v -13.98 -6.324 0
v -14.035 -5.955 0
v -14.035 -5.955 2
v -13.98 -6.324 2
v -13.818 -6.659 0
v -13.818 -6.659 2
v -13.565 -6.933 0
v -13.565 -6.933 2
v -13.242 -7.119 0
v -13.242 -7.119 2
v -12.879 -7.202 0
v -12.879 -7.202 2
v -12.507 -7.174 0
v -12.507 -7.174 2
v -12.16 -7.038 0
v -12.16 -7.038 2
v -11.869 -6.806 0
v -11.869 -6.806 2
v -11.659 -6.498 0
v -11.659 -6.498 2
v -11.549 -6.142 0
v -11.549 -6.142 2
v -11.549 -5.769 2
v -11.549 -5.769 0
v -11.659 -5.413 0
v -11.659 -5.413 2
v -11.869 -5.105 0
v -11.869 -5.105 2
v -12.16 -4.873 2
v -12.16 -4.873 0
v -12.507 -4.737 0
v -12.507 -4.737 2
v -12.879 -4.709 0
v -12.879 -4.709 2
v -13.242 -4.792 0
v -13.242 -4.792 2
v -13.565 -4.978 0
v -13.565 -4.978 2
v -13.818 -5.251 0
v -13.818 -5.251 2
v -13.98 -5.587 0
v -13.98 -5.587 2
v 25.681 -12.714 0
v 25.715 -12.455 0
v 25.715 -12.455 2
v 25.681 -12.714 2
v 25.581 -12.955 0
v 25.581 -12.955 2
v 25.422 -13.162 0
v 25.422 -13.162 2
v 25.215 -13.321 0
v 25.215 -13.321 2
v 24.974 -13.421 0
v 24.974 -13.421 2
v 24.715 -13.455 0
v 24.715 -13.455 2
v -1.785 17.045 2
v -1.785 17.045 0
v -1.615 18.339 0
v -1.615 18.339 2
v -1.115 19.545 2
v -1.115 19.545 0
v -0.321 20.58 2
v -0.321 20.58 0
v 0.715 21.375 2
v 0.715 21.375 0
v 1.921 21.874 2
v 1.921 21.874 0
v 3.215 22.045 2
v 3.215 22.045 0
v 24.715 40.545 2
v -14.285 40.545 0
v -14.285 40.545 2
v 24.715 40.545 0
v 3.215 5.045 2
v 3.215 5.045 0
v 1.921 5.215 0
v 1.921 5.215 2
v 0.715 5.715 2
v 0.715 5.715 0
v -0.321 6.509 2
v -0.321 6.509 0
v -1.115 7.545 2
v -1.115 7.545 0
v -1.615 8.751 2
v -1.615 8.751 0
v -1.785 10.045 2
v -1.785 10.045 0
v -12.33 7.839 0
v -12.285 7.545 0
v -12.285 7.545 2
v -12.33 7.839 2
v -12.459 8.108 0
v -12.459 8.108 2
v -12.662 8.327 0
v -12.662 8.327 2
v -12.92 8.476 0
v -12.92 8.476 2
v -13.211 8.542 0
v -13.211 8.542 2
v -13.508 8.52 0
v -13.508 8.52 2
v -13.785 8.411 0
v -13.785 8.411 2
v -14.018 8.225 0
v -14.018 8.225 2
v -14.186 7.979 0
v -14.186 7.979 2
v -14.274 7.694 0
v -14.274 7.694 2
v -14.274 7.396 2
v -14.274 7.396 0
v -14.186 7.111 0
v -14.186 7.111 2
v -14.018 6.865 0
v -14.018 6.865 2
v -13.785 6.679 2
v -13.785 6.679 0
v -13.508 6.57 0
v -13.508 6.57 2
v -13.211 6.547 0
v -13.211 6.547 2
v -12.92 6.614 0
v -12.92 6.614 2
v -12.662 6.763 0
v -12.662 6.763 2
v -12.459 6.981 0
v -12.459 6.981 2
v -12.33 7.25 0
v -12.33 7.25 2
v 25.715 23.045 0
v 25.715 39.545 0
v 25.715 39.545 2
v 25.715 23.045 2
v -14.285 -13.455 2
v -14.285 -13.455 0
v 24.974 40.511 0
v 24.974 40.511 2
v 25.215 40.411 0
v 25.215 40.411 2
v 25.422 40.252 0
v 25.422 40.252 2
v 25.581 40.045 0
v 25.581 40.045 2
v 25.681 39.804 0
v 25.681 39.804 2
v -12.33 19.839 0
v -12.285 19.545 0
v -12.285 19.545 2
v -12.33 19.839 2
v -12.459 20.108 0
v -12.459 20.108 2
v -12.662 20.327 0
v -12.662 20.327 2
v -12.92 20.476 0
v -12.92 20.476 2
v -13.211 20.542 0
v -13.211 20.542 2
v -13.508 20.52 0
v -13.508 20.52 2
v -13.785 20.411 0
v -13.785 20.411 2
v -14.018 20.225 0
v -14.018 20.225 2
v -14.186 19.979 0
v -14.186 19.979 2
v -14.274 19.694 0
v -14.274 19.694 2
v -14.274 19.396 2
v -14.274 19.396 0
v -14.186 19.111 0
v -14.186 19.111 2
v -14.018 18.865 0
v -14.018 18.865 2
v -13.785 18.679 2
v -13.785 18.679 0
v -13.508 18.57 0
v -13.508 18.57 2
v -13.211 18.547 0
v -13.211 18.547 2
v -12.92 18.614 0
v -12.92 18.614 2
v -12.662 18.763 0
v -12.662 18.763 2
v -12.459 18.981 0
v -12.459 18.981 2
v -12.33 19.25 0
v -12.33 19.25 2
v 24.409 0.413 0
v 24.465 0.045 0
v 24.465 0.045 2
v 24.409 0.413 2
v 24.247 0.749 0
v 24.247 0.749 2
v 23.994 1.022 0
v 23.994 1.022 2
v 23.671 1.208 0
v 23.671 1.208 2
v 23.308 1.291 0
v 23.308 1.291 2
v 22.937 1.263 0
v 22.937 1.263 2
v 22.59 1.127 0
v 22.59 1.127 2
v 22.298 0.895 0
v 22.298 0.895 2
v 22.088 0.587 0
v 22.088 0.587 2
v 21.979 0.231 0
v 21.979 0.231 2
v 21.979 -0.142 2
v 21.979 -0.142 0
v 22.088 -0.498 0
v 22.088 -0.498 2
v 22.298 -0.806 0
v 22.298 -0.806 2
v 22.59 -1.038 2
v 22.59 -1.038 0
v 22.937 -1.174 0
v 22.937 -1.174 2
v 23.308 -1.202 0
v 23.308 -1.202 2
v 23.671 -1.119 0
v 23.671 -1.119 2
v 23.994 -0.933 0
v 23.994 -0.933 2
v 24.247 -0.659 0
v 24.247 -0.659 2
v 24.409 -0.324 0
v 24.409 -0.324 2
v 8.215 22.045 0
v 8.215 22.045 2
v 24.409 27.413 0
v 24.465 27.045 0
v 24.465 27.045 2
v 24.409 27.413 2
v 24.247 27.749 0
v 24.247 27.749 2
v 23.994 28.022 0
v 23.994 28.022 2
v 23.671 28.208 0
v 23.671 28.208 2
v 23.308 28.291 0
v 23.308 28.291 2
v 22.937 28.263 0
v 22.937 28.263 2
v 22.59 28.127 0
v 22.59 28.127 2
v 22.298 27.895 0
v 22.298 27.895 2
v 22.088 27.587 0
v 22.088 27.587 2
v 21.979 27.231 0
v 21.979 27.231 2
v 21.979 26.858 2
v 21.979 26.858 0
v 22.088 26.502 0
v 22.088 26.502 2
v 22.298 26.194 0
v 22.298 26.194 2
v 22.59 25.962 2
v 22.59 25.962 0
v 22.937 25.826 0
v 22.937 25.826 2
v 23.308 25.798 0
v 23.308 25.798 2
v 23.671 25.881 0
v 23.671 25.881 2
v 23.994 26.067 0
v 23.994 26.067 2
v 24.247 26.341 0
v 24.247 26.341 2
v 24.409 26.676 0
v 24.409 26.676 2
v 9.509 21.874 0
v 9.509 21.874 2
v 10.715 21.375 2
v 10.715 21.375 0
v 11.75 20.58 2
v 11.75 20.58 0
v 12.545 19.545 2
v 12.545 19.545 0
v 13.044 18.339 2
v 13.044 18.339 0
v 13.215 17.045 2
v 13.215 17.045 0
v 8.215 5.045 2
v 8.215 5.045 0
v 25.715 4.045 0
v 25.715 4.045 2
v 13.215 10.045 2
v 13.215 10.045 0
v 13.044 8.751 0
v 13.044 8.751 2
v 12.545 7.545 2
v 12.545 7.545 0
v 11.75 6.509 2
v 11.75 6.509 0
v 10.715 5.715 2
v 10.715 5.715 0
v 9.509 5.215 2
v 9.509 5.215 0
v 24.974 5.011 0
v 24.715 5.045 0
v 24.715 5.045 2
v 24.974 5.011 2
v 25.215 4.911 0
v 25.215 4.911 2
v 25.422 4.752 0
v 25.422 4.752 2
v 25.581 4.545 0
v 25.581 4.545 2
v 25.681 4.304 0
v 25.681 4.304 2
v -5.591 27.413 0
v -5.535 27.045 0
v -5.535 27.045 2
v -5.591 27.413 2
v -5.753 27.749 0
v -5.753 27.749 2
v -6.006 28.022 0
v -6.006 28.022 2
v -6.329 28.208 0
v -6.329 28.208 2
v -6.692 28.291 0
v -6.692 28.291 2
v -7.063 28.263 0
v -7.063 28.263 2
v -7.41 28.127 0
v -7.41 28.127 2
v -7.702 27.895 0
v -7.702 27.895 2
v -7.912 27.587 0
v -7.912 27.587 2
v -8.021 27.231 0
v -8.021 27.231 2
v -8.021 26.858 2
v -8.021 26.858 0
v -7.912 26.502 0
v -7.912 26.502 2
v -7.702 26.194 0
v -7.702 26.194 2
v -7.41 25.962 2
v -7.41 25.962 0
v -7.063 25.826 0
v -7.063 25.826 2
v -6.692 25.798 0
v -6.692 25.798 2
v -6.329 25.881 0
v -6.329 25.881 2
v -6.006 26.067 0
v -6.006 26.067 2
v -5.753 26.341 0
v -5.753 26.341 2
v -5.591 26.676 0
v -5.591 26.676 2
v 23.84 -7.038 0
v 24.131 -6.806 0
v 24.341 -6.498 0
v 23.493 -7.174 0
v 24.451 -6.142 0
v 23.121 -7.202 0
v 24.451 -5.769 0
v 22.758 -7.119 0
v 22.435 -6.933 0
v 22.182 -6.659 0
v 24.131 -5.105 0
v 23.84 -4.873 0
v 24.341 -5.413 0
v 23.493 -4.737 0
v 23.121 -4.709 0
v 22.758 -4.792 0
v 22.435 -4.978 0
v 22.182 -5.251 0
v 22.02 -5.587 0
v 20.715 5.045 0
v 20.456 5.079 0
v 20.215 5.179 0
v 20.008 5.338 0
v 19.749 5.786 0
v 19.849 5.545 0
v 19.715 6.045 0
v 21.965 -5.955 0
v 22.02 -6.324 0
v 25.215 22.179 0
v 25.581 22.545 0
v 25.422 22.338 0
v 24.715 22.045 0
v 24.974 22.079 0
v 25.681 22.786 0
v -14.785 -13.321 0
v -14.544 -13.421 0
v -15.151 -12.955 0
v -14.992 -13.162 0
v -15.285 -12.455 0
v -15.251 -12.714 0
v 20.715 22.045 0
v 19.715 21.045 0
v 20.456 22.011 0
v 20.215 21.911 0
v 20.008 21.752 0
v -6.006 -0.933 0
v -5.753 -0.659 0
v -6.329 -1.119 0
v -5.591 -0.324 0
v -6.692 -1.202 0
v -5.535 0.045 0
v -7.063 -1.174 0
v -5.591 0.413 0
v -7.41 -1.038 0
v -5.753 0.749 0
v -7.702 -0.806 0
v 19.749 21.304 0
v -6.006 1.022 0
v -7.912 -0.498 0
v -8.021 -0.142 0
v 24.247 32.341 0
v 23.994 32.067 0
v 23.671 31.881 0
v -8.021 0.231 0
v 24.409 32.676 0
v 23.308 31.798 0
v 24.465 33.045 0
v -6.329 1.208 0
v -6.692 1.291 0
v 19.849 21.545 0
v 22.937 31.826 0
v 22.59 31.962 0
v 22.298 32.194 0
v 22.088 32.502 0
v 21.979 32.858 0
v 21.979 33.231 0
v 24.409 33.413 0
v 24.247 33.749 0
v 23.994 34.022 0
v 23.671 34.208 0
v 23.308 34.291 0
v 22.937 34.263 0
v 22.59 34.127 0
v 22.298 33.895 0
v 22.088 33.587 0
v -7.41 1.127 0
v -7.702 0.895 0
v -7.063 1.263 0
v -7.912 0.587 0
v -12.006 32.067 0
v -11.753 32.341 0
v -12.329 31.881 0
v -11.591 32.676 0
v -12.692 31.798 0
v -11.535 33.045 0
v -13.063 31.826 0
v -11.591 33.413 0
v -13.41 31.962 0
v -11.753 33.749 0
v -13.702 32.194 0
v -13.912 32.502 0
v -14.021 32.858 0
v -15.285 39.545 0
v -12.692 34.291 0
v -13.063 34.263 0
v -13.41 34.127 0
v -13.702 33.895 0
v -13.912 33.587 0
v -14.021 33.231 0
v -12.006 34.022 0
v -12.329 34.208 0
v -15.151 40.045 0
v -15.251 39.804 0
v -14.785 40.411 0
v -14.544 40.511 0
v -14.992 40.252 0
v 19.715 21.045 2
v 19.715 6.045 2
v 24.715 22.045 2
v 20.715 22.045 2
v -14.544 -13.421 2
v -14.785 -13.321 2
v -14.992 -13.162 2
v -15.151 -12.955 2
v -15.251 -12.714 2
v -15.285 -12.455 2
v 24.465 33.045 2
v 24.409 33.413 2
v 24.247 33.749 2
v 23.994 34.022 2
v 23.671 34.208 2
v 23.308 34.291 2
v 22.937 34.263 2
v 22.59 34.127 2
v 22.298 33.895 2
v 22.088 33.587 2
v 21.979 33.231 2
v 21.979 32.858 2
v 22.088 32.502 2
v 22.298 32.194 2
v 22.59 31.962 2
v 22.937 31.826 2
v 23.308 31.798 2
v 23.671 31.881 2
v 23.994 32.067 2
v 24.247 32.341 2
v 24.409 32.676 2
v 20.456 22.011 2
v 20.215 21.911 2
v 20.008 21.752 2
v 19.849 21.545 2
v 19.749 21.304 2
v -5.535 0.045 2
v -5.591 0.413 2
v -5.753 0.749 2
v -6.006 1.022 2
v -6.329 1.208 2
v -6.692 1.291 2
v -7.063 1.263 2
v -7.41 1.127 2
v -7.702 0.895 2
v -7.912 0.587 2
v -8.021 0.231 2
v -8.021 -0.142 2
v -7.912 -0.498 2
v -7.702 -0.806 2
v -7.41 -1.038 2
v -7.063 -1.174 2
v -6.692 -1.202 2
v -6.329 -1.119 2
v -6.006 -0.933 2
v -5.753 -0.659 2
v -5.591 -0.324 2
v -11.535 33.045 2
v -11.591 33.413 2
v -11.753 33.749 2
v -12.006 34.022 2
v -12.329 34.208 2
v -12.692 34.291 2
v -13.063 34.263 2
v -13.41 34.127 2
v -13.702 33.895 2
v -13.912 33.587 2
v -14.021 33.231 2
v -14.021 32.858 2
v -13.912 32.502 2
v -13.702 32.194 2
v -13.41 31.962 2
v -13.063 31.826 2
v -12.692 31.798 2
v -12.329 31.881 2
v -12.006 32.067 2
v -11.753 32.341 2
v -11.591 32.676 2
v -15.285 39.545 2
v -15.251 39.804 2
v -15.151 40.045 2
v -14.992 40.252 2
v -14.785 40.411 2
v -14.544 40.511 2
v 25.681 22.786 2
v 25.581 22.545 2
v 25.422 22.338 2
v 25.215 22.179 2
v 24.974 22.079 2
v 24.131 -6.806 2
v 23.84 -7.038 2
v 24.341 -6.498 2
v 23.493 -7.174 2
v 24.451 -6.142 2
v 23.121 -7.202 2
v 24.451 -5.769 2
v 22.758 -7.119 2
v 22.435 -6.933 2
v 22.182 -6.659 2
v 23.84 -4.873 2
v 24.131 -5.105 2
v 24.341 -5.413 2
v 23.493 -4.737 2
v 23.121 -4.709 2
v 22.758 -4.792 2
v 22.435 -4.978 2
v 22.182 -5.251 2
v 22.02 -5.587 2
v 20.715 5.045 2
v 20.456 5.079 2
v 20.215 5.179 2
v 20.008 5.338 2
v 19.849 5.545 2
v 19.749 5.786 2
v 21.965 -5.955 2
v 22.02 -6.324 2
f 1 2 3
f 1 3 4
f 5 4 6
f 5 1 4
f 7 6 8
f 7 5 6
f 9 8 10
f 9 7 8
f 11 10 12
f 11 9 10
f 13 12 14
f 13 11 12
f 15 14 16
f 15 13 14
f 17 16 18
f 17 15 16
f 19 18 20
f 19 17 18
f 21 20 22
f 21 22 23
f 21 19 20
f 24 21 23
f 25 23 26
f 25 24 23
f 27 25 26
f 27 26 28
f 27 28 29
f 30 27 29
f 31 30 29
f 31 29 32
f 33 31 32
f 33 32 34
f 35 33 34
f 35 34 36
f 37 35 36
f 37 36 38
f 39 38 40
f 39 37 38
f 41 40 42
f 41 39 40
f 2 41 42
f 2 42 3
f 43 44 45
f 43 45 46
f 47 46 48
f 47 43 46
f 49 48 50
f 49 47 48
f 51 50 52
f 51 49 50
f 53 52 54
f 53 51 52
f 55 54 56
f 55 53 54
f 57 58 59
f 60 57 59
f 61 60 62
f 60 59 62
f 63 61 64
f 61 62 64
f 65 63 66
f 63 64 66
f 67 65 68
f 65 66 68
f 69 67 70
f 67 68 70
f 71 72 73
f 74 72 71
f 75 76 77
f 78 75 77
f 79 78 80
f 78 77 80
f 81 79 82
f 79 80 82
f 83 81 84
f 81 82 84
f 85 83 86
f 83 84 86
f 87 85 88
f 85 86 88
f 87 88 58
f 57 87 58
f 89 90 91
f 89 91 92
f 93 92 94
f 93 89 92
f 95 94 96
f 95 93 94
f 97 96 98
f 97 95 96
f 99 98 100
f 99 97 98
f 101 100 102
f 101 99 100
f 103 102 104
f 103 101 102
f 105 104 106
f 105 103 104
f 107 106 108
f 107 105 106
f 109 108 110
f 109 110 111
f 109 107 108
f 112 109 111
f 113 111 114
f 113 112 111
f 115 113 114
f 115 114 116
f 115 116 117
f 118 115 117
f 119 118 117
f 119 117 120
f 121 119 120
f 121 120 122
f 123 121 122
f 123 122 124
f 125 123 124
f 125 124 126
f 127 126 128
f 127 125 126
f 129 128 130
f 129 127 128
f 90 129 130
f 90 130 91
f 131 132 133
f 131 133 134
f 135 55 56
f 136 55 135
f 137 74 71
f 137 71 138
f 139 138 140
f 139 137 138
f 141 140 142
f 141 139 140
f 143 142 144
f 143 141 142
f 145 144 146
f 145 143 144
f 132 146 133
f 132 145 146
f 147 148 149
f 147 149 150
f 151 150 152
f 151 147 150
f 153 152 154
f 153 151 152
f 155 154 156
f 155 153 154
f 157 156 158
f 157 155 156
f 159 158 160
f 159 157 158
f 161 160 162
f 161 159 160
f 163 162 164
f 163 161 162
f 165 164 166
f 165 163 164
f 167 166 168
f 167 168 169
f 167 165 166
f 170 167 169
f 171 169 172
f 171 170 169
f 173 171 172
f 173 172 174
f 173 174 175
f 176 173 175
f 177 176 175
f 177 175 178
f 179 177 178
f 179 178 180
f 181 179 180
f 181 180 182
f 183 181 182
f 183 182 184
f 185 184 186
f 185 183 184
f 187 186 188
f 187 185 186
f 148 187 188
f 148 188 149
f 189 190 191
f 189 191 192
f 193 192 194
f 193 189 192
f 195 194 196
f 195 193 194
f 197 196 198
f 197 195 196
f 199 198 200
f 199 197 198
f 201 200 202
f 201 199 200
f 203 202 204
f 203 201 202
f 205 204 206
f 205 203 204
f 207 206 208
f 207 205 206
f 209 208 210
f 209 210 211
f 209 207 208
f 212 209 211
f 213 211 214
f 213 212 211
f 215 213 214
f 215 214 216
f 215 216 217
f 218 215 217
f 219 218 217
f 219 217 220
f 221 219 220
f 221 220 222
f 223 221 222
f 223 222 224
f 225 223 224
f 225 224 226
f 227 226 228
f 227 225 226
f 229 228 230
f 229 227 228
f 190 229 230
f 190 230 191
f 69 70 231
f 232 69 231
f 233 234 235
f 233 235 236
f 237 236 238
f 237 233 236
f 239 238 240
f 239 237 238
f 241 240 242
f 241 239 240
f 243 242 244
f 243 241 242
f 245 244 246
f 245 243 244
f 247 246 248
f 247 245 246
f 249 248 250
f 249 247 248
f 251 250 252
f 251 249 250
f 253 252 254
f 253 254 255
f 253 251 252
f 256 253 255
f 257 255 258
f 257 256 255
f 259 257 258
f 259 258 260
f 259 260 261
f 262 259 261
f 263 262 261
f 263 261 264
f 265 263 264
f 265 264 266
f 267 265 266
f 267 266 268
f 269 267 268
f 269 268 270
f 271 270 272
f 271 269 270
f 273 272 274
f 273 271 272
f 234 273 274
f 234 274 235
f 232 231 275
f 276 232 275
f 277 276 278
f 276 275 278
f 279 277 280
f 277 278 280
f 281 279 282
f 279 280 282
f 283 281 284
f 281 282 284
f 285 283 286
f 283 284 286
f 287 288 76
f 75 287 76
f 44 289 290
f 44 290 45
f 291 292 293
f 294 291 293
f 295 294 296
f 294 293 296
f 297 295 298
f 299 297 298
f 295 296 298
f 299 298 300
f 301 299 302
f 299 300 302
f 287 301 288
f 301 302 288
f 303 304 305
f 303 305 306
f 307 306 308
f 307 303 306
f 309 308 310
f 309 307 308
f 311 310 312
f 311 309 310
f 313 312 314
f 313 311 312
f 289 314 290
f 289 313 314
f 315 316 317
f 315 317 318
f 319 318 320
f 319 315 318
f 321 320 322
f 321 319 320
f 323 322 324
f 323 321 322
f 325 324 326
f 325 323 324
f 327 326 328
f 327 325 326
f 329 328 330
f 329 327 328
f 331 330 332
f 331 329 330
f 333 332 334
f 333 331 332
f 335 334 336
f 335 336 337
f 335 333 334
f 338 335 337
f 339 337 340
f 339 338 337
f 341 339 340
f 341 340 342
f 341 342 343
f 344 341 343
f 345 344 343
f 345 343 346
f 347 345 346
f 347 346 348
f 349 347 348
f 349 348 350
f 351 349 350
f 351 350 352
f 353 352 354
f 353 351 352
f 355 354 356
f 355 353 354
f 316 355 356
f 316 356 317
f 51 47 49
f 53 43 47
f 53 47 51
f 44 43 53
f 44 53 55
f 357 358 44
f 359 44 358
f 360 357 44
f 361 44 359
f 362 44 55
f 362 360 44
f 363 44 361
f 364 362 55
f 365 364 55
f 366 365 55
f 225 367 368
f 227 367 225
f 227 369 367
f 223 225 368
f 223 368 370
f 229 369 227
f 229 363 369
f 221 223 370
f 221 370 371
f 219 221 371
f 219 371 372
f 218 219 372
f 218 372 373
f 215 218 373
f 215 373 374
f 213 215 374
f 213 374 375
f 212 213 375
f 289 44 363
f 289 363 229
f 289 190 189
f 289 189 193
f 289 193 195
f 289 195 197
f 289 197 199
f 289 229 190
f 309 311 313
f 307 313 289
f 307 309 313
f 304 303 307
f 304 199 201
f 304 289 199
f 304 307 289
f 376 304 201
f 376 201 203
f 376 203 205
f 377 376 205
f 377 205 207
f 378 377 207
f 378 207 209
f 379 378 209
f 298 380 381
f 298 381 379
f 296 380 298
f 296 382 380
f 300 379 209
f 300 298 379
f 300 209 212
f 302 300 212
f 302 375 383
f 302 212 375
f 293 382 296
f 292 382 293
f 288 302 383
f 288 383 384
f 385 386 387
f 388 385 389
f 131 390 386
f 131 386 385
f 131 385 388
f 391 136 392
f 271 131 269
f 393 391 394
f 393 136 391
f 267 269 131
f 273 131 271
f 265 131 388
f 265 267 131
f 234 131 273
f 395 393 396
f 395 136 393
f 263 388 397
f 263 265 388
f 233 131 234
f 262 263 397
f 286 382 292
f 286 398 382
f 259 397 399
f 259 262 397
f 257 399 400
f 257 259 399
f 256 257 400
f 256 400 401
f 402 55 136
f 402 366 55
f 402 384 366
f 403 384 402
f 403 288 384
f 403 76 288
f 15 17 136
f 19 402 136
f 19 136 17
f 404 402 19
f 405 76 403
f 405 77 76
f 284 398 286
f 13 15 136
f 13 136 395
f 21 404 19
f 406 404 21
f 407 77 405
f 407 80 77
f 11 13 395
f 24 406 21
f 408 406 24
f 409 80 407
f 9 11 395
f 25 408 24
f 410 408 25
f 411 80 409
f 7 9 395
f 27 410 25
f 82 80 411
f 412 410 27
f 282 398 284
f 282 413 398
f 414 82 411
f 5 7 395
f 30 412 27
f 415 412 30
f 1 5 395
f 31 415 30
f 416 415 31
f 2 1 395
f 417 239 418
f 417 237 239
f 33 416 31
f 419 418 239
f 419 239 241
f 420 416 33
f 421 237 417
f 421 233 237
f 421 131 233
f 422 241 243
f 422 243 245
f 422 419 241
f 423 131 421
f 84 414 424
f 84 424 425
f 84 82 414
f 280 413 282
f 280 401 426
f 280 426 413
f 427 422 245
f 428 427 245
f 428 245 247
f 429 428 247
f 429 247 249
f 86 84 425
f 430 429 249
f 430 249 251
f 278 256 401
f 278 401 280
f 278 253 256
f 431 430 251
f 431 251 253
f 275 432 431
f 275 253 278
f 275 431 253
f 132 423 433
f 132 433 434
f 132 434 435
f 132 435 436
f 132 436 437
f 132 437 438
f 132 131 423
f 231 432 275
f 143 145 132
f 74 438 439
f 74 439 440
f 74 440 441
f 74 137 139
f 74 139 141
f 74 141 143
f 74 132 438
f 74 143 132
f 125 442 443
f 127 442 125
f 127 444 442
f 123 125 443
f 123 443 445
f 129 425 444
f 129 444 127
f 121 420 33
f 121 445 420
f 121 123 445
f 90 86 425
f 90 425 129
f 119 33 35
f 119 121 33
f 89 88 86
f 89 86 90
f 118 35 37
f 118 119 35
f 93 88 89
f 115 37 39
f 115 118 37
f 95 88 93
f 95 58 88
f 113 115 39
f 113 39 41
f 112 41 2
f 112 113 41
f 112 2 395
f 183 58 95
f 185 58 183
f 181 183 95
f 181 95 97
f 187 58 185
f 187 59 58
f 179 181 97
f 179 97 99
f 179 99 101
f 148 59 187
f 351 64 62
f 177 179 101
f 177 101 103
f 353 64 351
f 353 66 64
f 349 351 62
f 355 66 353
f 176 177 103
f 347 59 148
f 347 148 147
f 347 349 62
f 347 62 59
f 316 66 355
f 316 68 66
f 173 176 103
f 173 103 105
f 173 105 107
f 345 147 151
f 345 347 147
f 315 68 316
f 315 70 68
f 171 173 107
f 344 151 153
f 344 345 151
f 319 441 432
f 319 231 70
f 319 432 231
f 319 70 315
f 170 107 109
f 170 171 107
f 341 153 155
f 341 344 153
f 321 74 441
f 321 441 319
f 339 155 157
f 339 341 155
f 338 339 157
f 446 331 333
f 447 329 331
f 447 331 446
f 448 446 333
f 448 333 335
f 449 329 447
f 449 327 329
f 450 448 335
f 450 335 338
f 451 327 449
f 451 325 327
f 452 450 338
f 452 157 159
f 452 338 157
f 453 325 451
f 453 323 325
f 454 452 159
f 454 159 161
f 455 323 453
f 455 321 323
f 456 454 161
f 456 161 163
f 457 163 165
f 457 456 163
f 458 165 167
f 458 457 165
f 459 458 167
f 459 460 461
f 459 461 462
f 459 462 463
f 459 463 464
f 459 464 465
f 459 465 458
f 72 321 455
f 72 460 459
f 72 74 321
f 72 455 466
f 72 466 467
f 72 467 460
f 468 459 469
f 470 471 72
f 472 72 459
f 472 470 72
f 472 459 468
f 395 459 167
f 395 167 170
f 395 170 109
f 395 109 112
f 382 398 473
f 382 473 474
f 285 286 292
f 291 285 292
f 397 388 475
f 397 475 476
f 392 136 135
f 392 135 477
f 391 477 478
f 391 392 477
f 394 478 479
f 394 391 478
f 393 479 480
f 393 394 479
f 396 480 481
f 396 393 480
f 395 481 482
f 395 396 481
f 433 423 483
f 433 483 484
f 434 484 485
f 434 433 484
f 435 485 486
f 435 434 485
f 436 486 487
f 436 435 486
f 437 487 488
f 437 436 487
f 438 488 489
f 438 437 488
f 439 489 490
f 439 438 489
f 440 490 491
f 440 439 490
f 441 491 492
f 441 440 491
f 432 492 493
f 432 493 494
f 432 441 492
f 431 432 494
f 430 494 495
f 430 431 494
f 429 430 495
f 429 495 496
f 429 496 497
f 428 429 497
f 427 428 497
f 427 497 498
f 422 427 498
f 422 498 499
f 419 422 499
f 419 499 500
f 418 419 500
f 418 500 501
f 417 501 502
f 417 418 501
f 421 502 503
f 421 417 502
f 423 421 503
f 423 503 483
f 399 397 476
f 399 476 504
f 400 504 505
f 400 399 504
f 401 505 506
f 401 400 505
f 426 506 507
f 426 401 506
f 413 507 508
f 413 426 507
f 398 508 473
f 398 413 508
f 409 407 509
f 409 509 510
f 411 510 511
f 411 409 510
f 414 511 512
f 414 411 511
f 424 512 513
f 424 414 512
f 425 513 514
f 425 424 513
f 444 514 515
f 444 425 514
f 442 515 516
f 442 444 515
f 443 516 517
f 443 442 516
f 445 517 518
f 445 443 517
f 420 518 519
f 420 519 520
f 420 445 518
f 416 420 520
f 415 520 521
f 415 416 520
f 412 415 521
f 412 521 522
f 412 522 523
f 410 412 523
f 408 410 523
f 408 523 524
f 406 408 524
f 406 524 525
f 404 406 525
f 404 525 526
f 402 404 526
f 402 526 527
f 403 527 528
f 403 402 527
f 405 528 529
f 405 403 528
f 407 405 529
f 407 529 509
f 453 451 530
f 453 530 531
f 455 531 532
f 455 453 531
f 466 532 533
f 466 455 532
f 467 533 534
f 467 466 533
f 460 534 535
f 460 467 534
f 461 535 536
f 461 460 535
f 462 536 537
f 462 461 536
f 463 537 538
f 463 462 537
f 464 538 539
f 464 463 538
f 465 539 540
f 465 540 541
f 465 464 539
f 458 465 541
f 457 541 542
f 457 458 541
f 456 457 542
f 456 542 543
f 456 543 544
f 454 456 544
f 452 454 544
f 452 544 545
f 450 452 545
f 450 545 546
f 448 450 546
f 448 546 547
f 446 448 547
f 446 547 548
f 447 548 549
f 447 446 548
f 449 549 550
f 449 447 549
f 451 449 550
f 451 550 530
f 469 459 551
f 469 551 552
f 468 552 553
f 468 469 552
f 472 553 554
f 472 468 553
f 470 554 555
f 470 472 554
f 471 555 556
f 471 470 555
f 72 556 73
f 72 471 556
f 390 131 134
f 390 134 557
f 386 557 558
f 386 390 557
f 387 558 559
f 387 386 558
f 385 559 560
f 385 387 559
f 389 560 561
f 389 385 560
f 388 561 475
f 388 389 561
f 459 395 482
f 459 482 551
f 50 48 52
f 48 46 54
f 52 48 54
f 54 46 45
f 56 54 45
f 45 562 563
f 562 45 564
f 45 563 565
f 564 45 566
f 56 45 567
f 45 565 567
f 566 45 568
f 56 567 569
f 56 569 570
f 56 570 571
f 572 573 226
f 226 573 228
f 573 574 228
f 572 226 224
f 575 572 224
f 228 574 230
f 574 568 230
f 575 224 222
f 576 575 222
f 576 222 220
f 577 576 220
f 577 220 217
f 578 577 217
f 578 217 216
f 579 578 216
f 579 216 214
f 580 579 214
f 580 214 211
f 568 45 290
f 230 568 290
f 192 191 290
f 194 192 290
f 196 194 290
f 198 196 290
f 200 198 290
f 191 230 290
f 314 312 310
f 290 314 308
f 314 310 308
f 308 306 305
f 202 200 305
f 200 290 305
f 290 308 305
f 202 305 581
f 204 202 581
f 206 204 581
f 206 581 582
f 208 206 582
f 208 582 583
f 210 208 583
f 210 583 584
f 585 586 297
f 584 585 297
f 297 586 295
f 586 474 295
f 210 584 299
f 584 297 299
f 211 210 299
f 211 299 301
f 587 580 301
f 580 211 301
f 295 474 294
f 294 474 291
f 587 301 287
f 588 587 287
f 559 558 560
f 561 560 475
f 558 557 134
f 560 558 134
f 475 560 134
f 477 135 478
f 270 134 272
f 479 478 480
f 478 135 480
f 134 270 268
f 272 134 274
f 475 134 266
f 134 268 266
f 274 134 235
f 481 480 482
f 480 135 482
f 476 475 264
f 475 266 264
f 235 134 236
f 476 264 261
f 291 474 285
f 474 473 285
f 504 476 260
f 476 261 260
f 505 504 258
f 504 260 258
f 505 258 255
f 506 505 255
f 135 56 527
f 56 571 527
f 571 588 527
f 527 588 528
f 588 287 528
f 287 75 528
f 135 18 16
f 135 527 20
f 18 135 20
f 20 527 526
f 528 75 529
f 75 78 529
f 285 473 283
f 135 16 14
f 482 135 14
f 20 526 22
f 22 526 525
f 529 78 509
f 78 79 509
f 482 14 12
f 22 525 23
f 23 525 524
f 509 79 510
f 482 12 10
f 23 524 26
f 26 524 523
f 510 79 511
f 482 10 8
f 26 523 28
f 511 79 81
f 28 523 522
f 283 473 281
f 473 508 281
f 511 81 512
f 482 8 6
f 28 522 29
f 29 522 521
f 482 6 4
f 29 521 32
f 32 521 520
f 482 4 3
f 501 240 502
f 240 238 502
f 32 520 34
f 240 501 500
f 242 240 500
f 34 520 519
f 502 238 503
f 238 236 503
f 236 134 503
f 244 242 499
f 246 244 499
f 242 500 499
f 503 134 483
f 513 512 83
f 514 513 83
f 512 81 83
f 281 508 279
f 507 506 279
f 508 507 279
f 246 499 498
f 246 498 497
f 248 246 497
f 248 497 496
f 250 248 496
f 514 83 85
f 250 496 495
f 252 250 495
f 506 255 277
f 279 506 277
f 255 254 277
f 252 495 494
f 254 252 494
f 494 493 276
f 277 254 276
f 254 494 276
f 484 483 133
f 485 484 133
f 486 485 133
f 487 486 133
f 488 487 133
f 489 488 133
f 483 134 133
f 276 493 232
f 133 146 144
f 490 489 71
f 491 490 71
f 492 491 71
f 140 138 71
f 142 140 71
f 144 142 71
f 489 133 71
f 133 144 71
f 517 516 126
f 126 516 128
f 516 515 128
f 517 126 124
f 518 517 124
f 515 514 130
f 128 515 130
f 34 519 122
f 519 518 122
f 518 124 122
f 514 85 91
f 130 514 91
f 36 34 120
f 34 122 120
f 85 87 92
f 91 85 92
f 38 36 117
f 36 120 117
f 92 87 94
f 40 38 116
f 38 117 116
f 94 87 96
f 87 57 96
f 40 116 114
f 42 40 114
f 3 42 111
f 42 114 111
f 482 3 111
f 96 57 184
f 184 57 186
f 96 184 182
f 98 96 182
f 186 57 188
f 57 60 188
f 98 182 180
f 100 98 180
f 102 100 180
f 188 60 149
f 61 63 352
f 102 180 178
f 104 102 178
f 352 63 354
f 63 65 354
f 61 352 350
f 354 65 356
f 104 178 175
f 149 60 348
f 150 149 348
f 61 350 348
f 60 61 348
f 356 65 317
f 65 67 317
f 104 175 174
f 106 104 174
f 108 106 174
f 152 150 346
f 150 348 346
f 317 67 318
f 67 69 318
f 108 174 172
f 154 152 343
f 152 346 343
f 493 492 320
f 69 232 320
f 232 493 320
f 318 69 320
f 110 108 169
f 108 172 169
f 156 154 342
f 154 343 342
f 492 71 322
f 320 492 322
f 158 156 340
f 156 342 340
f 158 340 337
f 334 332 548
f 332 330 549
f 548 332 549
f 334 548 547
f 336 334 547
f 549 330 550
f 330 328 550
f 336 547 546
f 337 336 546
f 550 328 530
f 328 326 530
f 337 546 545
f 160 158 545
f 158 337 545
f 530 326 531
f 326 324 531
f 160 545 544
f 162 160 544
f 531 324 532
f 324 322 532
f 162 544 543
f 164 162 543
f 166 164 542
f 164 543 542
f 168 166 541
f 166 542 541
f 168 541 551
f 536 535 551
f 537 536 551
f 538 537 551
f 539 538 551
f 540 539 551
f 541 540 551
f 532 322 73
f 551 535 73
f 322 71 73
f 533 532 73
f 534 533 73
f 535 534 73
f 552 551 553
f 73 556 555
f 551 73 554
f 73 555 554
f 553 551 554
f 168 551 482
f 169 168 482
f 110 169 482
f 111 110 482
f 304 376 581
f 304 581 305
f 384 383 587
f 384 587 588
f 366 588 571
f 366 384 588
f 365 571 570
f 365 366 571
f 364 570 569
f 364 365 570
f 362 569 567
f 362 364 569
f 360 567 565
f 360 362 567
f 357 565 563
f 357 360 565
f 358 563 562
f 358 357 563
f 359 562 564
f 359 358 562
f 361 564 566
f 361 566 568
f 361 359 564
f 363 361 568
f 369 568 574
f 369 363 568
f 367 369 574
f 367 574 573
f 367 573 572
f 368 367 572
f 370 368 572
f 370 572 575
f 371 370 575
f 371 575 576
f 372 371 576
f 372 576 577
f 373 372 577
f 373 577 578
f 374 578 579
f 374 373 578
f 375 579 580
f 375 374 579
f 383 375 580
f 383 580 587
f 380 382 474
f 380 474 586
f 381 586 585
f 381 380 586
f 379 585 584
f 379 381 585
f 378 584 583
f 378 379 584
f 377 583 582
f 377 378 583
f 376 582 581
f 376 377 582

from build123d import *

# Parameters (mm, degrees)
SKETCH_1_R      = 1.25
SKETCH_1_R_2    = 1
EXTRUDE_1_DEPTH = 2


with BuildPart() as part:
    # 草圖1 → 填料-伸長1 (new body)
    with BuildSketch(Plane.XY):
        with BuildLine():
            Line((25.714690816, 4.04468624), (25.714690816, -0.95531376))
            Line((25.714690816, -0.95531376), (25.714690816, -12.45531376))
            ThreePointArc((25.714690816, -12.45531376), (25.421797597, -13.162420542), (24.714690816, -13.45531376))
            Line((24.714690816, -13.45531376), (-14.285309184, -13.45531376))
            ThreePointArc((-14.285309184, -13.45531376), (-14.992415965, -13.162420542), (-15.285309184, -12.45531376))
            Line((-15.285309184, -12.45531376), (-15.285309184, 3.54468624))
            Line((-15.285309184, 3.54468624), (-15.285309184, 23.54468624))
            Line((-15.285309184, 23.54468624), (-15.285309184, 39.54468624))
            ThreePointArc((-15.285309184, 39.54468624), (-14.992415965, 40.251793021), (-14.285309184, 40.54468624))
            Line((-14.285309184, 40.54468624), (24.714690816, 40.54468624))
            ThreePointArc((24.714690816, 40.54468624), (25.421797597, 40.251793021), (25.714690816, 39.54468624))
            Line((25.714690816, 39.54468624), (25.714690816, 28.54468624))
            Line((25.714690816, 28.54468624), (25.714690816, 23.04468624))
            ThreePointArc((25.714690816, 23.04468624), (25.421797597, 22.337579458), (24.714690816, 22.04468624))
            Line((24.714690816, 22.04468624), (20.714690816, 22.04468624))
            ThreePointArc((20.714690816, 22.04468624), (20.007584035, 21.751793021), (19.714690816, 21.04468624))
            Line((19.714690816, 21.04468624), (19.714690816, 6.04468624))
            ThreePointArc((19.714690816, 6.04468624), (20.007584035, 5.337579458), (20.714690816, 5.04468624))
            Line((20.714690816, 5.04468624), (24.714690816, 5.04468624))
            ThreePointArc((24.714690816, 5.04468624), (25.421797597, 4.751793021), (25.714690816, 4.04468624))
        make_face()
        with Locations((-6.785309184, 27.04468624)):
            Circle(SKETCH_1_R, mode=Mode.SUBTRACT)
        with Locations((23.214690816, 27.04468624)):
            Circle(SKETCH_1_R, mode=Mode.SUBTRACT)
        with Locations((-6.785309184, 0.04468624)):
            Circle(SKETCH_1_R, mode=Mode.SUBTRACT)
        with Locations((23.214690816, 0.04468624)):
            Circle(SKETCH_1_R, mode=Mode.SUBTRACT)
        with Locations((-12.785309184, 33.04468624)):
            Circle(SKETCH_1_R, mode=Mode.SUBTRACT)
        with Locations((23.214690816, 33.04468624)):
            Circle(SKETCH_1_R, mode=Mode.SUBTRACT)
        with Locations(Location((23.214690816, -5.95531376, 0), (0, 0, 180))):
            Circle(SKETCH_1_R, mode=Mode.SUBTRACT)
        with Locations(Location((-12.785309184, -5.95531376, 0), (0, 0, 180))):
            Circle(SKETCH_1_R, mode=Mode.SUBTRACT)
        with Locations((-13.285309184, 19.54468624)):
            Circle(SKETCH_1_R_2, mode=Mode.SUBTRACT)
        with Locations((-13.285309184, 7.54468624)):
            Circle(SKETCH_1_R_2, mode=Mode.SUBTRACT)
        with BuildLine():
            Line((3.214690816, 22.04468624), (8.214690816, 22.04468624))
            ThreePointArc((8.214690816, 22.04468624), (11.750224722, 20.580220146), (13.214690816, 17.04468624))
            Line((13.214690816, 17.04468624), (13.214690816, 10.04468624))
            ThreePointArc((13.214690816, 10.04468624), (11.750224722, 6.509152334), (8.214690816, 5.04468624))
            Line((8.214690816, 5.04468624), (3.214690816, 5.04468624))
            ThreePointArc((3.214690816, 5.04468624), (-0.32084309, 6.509152334), (-1.785309184, 10.04468624))
            Line((-1.785309184, 10.04468624), (-1.785309184, 17.04468624))
            ThreePointArc((-1.785309184, 17.04468624), (-0.32084309, 20.580220146), (3.214690816, 22.04468624))
        make_face(mode=Mode.SUBTRACT)
    extrude(amount=EXTRUDE_1_DEPTH)


solid = part.part
